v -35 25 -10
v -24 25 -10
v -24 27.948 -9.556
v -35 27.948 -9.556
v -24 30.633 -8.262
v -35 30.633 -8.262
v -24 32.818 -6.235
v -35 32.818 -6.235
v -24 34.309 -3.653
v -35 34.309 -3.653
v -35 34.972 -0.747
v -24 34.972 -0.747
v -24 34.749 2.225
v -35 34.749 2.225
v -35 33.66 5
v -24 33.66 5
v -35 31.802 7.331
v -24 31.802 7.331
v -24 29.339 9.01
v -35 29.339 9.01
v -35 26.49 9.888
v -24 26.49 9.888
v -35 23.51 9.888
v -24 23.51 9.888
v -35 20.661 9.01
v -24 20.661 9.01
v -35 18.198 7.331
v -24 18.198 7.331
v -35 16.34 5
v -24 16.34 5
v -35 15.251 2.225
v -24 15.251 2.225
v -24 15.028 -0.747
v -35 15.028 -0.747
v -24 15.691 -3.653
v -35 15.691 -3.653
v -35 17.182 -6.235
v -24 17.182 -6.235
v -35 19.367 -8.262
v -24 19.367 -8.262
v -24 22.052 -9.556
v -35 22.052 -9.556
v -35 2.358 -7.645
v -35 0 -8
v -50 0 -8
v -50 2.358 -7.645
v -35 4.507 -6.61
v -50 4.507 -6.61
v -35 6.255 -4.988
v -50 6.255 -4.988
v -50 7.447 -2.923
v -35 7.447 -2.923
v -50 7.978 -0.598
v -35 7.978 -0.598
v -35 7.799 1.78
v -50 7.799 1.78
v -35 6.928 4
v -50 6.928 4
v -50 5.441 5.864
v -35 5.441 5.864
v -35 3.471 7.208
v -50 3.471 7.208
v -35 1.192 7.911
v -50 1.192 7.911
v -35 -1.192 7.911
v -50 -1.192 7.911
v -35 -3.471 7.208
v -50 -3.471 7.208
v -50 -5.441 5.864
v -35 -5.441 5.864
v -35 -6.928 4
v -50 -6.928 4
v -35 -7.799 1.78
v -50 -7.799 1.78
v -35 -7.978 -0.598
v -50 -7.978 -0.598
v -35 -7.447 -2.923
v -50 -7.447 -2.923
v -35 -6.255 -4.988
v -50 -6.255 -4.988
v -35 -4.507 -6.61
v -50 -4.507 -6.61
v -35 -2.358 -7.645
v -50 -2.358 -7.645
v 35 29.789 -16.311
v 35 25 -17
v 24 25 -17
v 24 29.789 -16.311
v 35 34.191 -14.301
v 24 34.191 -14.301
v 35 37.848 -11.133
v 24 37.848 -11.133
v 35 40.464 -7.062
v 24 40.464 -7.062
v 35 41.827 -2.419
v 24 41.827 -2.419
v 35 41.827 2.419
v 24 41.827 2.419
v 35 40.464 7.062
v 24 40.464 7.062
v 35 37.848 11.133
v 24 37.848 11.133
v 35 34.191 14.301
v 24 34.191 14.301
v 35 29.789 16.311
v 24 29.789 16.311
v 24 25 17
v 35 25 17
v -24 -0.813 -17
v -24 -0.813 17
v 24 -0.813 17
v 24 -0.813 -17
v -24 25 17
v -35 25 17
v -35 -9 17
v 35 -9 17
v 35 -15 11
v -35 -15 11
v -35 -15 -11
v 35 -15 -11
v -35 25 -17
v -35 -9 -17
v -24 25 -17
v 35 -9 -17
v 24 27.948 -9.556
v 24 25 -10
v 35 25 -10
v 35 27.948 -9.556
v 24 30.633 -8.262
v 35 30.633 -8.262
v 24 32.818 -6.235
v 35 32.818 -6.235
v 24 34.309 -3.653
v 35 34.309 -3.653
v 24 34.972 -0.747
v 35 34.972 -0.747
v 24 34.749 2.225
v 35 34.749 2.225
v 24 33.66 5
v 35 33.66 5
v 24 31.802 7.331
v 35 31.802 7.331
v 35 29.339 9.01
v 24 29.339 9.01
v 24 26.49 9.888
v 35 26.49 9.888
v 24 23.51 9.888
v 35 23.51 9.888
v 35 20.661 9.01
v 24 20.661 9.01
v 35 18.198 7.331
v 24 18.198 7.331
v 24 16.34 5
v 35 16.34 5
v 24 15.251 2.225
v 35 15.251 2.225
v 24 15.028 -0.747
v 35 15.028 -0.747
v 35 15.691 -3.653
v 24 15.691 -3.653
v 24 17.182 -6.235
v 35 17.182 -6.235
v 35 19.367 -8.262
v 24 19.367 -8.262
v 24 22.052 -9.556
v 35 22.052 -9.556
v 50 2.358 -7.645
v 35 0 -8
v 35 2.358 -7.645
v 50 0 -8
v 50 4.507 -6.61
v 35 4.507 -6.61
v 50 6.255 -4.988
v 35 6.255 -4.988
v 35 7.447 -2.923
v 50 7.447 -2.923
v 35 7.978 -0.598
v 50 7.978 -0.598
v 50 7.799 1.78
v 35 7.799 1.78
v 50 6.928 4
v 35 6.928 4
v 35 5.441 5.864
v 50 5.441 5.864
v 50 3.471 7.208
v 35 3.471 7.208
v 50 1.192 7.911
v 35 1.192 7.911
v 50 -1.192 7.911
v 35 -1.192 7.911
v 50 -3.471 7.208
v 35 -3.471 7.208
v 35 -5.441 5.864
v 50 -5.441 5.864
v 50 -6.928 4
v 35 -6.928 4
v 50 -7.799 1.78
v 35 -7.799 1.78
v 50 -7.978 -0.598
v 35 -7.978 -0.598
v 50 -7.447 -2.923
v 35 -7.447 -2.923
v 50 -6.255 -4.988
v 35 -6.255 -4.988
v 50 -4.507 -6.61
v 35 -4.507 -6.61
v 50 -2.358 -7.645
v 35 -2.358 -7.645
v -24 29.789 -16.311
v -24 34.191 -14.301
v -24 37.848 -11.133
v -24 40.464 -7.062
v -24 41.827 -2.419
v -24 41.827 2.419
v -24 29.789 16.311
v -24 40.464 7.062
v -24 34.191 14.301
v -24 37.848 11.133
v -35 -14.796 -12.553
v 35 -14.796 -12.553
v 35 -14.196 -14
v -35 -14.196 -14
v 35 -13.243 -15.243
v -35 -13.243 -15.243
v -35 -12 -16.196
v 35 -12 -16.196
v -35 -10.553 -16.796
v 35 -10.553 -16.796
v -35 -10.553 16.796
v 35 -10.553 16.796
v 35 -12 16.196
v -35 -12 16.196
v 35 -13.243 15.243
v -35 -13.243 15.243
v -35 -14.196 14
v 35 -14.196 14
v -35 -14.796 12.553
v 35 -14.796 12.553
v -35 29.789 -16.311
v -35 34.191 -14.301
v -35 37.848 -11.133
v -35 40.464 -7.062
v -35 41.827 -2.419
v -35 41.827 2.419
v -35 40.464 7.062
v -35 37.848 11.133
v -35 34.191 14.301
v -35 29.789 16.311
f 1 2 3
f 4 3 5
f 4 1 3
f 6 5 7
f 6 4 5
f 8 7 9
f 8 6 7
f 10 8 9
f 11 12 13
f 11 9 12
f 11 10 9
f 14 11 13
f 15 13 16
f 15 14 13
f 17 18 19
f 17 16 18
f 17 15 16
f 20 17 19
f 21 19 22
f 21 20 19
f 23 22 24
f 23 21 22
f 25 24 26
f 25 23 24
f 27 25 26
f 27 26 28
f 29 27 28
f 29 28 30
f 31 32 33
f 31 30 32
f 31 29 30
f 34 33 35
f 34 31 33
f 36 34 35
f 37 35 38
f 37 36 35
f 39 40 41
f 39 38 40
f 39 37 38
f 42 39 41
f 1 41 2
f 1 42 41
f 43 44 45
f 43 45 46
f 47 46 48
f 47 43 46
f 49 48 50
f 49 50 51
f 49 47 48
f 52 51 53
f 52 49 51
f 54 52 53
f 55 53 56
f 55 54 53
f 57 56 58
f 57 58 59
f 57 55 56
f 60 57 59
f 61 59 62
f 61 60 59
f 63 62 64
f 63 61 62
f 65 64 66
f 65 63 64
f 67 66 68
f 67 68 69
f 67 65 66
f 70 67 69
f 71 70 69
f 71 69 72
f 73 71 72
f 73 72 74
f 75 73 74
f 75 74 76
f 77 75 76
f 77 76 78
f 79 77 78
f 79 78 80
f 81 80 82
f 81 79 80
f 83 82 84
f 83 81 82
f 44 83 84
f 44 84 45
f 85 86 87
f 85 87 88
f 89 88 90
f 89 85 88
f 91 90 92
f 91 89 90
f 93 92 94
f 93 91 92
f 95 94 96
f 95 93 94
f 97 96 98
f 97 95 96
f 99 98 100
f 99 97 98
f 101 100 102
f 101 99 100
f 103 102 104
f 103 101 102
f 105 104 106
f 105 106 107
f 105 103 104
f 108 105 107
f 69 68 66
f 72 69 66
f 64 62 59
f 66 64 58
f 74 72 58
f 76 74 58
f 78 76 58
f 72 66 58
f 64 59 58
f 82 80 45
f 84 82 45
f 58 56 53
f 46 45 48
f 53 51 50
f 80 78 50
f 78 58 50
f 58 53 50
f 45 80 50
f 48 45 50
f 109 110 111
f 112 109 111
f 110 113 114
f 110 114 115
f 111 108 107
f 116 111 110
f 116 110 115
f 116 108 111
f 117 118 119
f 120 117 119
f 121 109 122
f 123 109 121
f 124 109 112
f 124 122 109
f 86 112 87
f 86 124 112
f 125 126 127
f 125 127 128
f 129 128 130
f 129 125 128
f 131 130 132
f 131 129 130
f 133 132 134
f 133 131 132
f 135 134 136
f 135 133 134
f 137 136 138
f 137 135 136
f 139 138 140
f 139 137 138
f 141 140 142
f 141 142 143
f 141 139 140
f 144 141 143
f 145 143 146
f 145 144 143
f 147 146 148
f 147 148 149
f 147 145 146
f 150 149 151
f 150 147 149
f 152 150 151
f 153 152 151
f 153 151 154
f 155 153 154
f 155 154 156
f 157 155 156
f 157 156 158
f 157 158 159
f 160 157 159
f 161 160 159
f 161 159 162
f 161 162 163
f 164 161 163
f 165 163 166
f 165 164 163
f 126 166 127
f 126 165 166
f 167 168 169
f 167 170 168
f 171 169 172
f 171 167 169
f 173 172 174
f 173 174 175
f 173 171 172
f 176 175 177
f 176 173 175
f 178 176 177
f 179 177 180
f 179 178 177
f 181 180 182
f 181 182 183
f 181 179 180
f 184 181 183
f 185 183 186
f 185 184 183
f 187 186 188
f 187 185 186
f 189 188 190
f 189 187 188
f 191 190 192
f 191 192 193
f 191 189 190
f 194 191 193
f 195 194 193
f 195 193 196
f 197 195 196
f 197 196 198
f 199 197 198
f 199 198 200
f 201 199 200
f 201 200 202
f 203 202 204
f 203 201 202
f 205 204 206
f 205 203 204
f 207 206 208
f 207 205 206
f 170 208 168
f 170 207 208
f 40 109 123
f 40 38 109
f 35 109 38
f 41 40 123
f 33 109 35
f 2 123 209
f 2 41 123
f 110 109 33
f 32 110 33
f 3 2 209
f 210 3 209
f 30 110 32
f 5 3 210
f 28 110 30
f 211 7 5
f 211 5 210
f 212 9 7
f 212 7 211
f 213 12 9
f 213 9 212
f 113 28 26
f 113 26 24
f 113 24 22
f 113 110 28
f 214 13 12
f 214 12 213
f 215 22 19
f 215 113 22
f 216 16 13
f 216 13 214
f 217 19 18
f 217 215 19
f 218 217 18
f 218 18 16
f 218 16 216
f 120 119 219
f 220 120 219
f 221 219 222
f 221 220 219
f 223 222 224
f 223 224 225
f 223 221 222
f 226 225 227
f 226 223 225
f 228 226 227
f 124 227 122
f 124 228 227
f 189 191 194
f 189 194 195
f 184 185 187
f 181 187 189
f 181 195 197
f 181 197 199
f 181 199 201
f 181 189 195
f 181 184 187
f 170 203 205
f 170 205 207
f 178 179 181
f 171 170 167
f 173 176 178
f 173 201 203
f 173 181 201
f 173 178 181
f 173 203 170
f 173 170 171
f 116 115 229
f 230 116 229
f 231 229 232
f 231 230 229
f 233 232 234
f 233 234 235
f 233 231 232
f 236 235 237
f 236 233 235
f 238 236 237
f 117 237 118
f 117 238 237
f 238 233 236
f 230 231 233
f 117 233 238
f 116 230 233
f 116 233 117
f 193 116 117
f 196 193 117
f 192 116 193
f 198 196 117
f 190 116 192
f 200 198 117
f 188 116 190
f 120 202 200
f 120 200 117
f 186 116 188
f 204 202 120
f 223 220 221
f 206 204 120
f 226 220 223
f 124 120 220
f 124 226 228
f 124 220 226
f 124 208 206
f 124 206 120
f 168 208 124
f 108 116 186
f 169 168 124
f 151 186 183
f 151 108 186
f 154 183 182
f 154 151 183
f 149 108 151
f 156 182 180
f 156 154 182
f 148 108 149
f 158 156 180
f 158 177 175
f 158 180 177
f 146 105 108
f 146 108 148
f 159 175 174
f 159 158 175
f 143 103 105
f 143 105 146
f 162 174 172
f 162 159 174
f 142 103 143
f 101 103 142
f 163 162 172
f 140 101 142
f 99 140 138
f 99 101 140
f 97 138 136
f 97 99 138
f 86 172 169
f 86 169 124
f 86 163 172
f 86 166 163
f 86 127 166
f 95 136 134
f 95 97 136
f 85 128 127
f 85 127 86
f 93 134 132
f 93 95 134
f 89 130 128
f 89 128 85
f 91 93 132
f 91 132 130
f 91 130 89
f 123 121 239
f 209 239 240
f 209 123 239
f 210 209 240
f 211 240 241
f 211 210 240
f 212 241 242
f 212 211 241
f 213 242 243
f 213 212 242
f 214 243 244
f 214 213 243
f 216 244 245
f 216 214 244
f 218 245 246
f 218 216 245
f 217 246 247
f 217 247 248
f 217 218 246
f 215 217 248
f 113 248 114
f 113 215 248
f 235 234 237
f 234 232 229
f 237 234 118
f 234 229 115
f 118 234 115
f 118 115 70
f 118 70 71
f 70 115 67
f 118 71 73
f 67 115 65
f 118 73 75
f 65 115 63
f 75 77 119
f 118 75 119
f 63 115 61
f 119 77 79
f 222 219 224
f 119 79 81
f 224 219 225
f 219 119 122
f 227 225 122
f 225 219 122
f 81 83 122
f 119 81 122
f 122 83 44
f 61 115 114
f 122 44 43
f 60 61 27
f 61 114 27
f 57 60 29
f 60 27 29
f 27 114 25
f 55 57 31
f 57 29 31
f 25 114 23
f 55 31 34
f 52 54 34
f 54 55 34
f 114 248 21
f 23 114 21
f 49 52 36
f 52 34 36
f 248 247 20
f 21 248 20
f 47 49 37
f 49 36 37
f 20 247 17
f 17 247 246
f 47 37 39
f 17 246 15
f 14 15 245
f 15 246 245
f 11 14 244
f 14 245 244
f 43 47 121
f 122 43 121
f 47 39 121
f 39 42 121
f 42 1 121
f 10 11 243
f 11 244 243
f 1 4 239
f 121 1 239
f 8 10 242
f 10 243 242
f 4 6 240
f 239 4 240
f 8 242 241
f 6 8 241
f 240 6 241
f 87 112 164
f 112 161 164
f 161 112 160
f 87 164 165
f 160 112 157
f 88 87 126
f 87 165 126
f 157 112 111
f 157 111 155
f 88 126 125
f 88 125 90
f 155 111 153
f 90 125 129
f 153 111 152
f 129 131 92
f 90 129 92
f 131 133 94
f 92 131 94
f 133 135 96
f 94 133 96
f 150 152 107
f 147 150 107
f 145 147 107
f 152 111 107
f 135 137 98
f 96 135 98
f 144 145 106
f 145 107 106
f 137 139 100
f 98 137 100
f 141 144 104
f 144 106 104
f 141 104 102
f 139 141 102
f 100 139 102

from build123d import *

# Parameters (mm, degrees)
SKETCH1_R           = 8
BOSS_EXTRUDE1_DEPTH = 50
SKETCH2_R           = 10
BOSS_EXTRUDE2_DEPTH = 35
SKETCH5_W           = 48
SKETCH5_H           = 42.813252044
CUT_EXTRUDE1_DEPTH  = 35


with BuildPart() as part:
    # Sketch1 → Boss-Extrude1 (new body, symmetric)
    with BuildSketch(Plane(origin=(0, 0, 0), x_dir=(0, 0, -1), z_dir=(1, 0, 0))):
        Circle(SKETCH1_R)
    extrude(amount=BOSS_EXTRUDE1_DEPTH, both=True)

    # Sketch2 → Boss-Extrude2 (add, symmetric)
    with BuildSketch(Plane(origin=(0, 0, 0), x_dir=(0, 0, -1), z_dir=(1, 0, 0))):
        with BuildLine():
            Line((-11, -15), (11, -15))
            ThreePointArc((11, -15), (15.242640687, -13.242640687), (17, -9))
            Line((17, -9), (17, 25))
            ThreePointArc((17, 25), (0, 42), (-17, 25))
            Line((-17, 25), (-17, -9))
            ThreePointArc((-17, -9), (-15.242640687, -13.242640687), (-11, -15))
        make_face()
        with Locations((0, 25)):
            Circle(SKETCH2_R, mode=Mode.SUBTRACT)
    extrude(amount=BOSS_EXTRUDE2_DEPTH, both=True)

    # Sketch5 → Cut-Extrude1 (cut, through all)
    with BuildSketch(Plane.XY.offset(17)):
        with Locations((0, 20.593373978)):
            Rectangle(SKETCH5_W, SKETCH5_H)
    extrude(amount=-CUT_EXTRUDE1_DEPTH, mode=Mode.SUBTRACT)


solid = part.part
